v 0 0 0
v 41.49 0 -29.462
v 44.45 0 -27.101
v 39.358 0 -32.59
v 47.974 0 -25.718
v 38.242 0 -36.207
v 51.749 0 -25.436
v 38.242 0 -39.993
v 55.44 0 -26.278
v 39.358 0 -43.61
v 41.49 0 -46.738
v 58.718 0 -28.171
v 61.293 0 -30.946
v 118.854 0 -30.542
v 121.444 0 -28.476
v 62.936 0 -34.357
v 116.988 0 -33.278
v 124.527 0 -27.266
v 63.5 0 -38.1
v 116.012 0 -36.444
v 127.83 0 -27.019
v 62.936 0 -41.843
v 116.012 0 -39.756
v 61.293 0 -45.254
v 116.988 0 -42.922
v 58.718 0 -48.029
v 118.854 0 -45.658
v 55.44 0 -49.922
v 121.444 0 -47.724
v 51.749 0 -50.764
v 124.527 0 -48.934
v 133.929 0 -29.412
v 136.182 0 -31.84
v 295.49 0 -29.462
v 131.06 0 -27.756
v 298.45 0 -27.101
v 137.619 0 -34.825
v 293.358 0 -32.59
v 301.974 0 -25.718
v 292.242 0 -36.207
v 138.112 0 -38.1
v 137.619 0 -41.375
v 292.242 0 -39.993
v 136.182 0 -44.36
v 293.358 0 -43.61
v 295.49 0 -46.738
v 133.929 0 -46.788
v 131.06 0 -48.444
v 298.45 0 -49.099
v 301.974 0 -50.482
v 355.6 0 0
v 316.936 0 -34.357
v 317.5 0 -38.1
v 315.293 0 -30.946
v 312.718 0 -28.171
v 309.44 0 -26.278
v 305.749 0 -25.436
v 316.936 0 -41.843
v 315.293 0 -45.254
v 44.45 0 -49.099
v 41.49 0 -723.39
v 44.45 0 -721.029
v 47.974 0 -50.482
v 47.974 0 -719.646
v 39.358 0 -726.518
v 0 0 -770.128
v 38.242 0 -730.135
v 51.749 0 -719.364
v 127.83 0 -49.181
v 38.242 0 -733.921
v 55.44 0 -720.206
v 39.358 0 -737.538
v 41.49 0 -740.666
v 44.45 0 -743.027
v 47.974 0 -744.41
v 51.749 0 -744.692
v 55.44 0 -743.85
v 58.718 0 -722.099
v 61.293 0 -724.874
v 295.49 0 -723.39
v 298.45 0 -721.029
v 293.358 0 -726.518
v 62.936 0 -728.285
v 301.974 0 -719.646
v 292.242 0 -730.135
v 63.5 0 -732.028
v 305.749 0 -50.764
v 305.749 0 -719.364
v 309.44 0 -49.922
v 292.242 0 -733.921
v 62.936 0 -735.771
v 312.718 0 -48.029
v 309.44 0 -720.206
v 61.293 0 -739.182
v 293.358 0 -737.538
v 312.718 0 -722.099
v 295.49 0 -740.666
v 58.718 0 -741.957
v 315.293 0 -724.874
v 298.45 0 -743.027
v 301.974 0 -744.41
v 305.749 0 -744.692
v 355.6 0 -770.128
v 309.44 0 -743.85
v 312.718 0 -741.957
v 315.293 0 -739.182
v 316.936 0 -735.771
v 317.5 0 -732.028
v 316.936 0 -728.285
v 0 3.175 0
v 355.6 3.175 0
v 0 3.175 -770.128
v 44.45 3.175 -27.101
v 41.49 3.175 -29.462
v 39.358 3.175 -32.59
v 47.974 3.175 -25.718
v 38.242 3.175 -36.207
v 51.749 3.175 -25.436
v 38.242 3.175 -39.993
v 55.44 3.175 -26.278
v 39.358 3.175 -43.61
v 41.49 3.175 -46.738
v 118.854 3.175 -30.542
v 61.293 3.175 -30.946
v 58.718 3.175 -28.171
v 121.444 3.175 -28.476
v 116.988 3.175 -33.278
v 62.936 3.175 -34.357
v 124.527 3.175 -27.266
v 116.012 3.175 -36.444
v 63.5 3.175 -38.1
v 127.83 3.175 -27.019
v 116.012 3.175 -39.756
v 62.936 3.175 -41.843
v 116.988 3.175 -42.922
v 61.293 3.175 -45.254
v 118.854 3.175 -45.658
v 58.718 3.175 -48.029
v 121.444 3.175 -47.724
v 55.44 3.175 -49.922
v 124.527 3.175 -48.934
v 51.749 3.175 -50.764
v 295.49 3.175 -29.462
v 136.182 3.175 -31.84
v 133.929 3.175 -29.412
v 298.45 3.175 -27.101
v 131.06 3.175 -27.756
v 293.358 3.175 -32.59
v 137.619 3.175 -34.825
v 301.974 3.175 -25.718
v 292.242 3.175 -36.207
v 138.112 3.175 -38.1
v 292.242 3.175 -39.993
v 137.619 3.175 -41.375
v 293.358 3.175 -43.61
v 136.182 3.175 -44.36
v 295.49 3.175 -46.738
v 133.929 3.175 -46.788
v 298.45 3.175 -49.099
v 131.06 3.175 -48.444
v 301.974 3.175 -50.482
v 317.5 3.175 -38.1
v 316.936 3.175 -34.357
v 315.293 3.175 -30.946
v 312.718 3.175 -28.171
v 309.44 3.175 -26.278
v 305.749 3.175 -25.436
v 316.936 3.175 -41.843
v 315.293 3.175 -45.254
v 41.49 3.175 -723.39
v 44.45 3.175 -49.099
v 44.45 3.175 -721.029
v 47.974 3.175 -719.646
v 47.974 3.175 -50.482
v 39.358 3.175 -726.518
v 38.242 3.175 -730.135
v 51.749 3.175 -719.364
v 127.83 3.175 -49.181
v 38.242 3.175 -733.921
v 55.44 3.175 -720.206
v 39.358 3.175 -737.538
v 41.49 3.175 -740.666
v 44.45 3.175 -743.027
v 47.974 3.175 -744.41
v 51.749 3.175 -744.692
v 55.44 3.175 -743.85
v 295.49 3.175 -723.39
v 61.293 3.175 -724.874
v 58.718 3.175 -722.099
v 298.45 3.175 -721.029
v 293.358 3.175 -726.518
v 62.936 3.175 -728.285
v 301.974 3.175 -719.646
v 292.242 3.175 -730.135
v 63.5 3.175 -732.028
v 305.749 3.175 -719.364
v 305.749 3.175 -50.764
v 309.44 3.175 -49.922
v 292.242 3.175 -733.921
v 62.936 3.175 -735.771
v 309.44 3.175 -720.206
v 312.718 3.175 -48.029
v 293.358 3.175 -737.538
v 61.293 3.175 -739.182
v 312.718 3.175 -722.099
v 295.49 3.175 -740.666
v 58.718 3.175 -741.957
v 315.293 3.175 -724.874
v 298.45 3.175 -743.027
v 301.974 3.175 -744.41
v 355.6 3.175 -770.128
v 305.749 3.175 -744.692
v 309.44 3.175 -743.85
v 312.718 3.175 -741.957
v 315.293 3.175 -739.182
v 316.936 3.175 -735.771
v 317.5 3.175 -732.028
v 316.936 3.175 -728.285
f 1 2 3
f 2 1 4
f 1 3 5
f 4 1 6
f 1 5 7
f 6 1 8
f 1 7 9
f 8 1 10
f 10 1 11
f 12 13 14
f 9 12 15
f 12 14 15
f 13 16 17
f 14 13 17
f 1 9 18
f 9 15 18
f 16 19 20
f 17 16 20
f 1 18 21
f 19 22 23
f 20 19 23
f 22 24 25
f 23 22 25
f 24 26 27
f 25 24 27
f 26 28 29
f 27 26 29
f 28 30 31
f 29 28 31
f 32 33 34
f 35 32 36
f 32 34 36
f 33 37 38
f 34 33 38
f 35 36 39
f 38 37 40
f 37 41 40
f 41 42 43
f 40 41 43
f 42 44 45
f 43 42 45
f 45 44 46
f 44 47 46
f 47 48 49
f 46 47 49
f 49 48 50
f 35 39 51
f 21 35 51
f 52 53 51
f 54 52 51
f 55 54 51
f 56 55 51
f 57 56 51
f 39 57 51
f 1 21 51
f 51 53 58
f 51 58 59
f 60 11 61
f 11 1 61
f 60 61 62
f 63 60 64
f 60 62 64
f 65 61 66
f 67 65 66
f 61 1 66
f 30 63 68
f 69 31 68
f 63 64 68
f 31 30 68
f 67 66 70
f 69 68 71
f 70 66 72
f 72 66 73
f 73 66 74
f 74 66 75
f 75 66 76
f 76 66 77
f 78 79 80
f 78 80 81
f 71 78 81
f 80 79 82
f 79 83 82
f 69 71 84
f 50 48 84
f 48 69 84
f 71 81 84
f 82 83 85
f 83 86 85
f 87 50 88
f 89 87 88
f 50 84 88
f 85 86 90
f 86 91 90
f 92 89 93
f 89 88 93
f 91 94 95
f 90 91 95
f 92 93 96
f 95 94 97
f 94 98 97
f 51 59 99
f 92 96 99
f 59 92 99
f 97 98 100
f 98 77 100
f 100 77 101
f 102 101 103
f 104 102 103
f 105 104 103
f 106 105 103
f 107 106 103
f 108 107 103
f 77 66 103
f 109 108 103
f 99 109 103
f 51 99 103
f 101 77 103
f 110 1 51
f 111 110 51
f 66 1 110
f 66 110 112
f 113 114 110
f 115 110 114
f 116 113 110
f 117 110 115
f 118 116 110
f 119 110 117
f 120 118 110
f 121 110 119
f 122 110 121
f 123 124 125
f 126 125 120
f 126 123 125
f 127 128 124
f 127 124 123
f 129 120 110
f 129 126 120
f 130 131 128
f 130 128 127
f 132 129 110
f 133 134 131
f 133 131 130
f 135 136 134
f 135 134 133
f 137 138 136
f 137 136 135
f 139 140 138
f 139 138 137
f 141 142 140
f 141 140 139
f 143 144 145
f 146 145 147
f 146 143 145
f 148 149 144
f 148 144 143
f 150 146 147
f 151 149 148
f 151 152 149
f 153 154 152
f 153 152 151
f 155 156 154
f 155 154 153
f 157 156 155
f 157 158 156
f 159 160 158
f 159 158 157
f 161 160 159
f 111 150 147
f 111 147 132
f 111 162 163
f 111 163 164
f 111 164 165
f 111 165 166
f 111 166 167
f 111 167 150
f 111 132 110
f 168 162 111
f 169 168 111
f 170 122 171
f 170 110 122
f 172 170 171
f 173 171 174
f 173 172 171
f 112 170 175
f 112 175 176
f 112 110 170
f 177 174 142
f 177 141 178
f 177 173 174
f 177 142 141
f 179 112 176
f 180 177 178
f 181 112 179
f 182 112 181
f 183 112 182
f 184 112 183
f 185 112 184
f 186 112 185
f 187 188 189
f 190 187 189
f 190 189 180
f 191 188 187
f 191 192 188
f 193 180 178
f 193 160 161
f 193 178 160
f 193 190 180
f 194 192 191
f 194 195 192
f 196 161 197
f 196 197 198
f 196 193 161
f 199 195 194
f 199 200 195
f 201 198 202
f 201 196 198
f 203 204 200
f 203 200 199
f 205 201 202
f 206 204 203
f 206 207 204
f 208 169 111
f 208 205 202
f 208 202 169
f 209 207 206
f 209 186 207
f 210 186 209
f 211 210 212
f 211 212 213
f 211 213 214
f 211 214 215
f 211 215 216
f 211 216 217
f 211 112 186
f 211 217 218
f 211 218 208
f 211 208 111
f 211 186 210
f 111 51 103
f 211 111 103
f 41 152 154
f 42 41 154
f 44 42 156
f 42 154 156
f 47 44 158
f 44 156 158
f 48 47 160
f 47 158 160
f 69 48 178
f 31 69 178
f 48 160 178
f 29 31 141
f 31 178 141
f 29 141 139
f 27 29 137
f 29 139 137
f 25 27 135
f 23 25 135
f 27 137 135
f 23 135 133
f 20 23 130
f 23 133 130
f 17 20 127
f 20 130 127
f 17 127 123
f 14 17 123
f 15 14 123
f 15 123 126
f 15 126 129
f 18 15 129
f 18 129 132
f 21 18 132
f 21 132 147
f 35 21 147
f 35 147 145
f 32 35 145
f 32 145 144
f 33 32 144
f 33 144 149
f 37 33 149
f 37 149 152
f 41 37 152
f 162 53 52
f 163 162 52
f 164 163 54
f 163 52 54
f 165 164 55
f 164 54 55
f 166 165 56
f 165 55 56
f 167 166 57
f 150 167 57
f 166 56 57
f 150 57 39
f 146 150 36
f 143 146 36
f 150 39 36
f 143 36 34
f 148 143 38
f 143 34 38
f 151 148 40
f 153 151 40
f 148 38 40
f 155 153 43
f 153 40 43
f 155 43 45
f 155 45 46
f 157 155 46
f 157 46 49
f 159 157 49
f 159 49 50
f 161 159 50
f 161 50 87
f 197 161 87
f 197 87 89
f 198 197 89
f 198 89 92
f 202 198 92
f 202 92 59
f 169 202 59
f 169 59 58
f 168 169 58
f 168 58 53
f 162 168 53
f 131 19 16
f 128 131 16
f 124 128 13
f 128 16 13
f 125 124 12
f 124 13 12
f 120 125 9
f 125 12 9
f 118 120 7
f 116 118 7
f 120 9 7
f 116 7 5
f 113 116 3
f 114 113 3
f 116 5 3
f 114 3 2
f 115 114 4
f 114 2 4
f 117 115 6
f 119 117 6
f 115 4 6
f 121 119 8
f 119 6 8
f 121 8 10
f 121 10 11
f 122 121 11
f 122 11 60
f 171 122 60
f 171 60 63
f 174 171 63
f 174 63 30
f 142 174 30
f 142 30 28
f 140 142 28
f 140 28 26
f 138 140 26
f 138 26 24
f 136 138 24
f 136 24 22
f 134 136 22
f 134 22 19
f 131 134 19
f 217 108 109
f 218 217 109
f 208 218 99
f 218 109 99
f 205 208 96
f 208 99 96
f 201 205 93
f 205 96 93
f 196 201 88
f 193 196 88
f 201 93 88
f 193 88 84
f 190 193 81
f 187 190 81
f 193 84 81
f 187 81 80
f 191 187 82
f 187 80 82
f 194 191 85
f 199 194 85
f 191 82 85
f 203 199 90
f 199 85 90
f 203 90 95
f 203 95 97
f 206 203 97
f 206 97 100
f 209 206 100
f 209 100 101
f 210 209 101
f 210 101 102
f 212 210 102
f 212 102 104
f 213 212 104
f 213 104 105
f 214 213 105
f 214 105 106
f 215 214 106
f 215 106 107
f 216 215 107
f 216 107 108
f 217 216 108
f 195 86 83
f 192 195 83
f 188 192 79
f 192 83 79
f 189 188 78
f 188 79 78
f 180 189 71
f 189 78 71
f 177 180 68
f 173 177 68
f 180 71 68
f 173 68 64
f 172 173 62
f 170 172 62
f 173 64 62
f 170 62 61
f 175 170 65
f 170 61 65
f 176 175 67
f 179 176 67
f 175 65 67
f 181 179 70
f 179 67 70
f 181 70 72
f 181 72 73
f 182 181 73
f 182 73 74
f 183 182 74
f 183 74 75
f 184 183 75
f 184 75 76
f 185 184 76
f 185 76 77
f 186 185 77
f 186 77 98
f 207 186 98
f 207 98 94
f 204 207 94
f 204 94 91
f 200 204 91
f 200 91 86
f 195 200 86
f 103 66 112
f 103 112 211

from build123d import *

# Parameters (mm, degrees)
SKETCH1_W                  = 355.6
SKETCH1_H                  = 770.128
BOSS_EXTRUDE1_DEPTH        = 3.175
F_1_1_DIAMETER_HOLE1_D     = 25.4
F_1_1_DIAMETER_HOLE1_DEPTH = 20.574
F_1_1_DIAMETER_HOLE1_TIP   = 7.630929862
SKETCH4_R                  = 11.1125
CUT_EXTRUDE1_DEPTH         = 4.175


with BuildPart() as part:
    # Sketch1 → Boss-Extrude1 (new body)
    with BuildSketch(Plane(origin=(0, 0, 0), x_dir=(1, 0, 0), z_dir=(0, 1, 0))):
        with Locations((177.8, 385.064)):
            Rectangle(SKETCH1_W, SKETCH1_H)
    extrude(amount=BOSS_EXTRUDE1_DEPTH)

    # 1 (1) Diameter Hole1
    with Locations(Plane(origin=(0, 3.175, 0), x_dir=(-1, 0, 0), z_dir=(0, 1, 0))):
        with Locations((-50.8, -38.1), (-50.8, -732.028), (-304.8, -732.028), (-304.8, -38.1)):
            Hole(F_1_1_DIAMETER_HOLE1_D / 2, depth=F_1_1_DIAMETER_HOLE1_DEPTH)
            with Locations((0, 0, -(F_1_1_DIAMETER_HOLE1_DEPTH + F_1_1_DIAMETER_HOLE1_TIP / 2))):  # 118° drill point
                Cone(0, F_1_1_DIAMETER_HOLE1_D / 2, F_1_1_DIAMETER_HOLE1_TIP, mode=Mode.SUBTRACT)

    # Sketch4 → Cut-Extrude1 (cut, through all)
    with BuildSketch(Plane(origin=(0, 3.175, 0), x_dir=(1, 0, 0), z_dir=(0, 1, 0))):
        with Locations((127, 38.1)):
            Circle(SKETCH4_R)
    extrude(amount=-CUT_EXTRUDE1_DEPTH, mode=Mode.SUBTRACT)


solid = part.part
